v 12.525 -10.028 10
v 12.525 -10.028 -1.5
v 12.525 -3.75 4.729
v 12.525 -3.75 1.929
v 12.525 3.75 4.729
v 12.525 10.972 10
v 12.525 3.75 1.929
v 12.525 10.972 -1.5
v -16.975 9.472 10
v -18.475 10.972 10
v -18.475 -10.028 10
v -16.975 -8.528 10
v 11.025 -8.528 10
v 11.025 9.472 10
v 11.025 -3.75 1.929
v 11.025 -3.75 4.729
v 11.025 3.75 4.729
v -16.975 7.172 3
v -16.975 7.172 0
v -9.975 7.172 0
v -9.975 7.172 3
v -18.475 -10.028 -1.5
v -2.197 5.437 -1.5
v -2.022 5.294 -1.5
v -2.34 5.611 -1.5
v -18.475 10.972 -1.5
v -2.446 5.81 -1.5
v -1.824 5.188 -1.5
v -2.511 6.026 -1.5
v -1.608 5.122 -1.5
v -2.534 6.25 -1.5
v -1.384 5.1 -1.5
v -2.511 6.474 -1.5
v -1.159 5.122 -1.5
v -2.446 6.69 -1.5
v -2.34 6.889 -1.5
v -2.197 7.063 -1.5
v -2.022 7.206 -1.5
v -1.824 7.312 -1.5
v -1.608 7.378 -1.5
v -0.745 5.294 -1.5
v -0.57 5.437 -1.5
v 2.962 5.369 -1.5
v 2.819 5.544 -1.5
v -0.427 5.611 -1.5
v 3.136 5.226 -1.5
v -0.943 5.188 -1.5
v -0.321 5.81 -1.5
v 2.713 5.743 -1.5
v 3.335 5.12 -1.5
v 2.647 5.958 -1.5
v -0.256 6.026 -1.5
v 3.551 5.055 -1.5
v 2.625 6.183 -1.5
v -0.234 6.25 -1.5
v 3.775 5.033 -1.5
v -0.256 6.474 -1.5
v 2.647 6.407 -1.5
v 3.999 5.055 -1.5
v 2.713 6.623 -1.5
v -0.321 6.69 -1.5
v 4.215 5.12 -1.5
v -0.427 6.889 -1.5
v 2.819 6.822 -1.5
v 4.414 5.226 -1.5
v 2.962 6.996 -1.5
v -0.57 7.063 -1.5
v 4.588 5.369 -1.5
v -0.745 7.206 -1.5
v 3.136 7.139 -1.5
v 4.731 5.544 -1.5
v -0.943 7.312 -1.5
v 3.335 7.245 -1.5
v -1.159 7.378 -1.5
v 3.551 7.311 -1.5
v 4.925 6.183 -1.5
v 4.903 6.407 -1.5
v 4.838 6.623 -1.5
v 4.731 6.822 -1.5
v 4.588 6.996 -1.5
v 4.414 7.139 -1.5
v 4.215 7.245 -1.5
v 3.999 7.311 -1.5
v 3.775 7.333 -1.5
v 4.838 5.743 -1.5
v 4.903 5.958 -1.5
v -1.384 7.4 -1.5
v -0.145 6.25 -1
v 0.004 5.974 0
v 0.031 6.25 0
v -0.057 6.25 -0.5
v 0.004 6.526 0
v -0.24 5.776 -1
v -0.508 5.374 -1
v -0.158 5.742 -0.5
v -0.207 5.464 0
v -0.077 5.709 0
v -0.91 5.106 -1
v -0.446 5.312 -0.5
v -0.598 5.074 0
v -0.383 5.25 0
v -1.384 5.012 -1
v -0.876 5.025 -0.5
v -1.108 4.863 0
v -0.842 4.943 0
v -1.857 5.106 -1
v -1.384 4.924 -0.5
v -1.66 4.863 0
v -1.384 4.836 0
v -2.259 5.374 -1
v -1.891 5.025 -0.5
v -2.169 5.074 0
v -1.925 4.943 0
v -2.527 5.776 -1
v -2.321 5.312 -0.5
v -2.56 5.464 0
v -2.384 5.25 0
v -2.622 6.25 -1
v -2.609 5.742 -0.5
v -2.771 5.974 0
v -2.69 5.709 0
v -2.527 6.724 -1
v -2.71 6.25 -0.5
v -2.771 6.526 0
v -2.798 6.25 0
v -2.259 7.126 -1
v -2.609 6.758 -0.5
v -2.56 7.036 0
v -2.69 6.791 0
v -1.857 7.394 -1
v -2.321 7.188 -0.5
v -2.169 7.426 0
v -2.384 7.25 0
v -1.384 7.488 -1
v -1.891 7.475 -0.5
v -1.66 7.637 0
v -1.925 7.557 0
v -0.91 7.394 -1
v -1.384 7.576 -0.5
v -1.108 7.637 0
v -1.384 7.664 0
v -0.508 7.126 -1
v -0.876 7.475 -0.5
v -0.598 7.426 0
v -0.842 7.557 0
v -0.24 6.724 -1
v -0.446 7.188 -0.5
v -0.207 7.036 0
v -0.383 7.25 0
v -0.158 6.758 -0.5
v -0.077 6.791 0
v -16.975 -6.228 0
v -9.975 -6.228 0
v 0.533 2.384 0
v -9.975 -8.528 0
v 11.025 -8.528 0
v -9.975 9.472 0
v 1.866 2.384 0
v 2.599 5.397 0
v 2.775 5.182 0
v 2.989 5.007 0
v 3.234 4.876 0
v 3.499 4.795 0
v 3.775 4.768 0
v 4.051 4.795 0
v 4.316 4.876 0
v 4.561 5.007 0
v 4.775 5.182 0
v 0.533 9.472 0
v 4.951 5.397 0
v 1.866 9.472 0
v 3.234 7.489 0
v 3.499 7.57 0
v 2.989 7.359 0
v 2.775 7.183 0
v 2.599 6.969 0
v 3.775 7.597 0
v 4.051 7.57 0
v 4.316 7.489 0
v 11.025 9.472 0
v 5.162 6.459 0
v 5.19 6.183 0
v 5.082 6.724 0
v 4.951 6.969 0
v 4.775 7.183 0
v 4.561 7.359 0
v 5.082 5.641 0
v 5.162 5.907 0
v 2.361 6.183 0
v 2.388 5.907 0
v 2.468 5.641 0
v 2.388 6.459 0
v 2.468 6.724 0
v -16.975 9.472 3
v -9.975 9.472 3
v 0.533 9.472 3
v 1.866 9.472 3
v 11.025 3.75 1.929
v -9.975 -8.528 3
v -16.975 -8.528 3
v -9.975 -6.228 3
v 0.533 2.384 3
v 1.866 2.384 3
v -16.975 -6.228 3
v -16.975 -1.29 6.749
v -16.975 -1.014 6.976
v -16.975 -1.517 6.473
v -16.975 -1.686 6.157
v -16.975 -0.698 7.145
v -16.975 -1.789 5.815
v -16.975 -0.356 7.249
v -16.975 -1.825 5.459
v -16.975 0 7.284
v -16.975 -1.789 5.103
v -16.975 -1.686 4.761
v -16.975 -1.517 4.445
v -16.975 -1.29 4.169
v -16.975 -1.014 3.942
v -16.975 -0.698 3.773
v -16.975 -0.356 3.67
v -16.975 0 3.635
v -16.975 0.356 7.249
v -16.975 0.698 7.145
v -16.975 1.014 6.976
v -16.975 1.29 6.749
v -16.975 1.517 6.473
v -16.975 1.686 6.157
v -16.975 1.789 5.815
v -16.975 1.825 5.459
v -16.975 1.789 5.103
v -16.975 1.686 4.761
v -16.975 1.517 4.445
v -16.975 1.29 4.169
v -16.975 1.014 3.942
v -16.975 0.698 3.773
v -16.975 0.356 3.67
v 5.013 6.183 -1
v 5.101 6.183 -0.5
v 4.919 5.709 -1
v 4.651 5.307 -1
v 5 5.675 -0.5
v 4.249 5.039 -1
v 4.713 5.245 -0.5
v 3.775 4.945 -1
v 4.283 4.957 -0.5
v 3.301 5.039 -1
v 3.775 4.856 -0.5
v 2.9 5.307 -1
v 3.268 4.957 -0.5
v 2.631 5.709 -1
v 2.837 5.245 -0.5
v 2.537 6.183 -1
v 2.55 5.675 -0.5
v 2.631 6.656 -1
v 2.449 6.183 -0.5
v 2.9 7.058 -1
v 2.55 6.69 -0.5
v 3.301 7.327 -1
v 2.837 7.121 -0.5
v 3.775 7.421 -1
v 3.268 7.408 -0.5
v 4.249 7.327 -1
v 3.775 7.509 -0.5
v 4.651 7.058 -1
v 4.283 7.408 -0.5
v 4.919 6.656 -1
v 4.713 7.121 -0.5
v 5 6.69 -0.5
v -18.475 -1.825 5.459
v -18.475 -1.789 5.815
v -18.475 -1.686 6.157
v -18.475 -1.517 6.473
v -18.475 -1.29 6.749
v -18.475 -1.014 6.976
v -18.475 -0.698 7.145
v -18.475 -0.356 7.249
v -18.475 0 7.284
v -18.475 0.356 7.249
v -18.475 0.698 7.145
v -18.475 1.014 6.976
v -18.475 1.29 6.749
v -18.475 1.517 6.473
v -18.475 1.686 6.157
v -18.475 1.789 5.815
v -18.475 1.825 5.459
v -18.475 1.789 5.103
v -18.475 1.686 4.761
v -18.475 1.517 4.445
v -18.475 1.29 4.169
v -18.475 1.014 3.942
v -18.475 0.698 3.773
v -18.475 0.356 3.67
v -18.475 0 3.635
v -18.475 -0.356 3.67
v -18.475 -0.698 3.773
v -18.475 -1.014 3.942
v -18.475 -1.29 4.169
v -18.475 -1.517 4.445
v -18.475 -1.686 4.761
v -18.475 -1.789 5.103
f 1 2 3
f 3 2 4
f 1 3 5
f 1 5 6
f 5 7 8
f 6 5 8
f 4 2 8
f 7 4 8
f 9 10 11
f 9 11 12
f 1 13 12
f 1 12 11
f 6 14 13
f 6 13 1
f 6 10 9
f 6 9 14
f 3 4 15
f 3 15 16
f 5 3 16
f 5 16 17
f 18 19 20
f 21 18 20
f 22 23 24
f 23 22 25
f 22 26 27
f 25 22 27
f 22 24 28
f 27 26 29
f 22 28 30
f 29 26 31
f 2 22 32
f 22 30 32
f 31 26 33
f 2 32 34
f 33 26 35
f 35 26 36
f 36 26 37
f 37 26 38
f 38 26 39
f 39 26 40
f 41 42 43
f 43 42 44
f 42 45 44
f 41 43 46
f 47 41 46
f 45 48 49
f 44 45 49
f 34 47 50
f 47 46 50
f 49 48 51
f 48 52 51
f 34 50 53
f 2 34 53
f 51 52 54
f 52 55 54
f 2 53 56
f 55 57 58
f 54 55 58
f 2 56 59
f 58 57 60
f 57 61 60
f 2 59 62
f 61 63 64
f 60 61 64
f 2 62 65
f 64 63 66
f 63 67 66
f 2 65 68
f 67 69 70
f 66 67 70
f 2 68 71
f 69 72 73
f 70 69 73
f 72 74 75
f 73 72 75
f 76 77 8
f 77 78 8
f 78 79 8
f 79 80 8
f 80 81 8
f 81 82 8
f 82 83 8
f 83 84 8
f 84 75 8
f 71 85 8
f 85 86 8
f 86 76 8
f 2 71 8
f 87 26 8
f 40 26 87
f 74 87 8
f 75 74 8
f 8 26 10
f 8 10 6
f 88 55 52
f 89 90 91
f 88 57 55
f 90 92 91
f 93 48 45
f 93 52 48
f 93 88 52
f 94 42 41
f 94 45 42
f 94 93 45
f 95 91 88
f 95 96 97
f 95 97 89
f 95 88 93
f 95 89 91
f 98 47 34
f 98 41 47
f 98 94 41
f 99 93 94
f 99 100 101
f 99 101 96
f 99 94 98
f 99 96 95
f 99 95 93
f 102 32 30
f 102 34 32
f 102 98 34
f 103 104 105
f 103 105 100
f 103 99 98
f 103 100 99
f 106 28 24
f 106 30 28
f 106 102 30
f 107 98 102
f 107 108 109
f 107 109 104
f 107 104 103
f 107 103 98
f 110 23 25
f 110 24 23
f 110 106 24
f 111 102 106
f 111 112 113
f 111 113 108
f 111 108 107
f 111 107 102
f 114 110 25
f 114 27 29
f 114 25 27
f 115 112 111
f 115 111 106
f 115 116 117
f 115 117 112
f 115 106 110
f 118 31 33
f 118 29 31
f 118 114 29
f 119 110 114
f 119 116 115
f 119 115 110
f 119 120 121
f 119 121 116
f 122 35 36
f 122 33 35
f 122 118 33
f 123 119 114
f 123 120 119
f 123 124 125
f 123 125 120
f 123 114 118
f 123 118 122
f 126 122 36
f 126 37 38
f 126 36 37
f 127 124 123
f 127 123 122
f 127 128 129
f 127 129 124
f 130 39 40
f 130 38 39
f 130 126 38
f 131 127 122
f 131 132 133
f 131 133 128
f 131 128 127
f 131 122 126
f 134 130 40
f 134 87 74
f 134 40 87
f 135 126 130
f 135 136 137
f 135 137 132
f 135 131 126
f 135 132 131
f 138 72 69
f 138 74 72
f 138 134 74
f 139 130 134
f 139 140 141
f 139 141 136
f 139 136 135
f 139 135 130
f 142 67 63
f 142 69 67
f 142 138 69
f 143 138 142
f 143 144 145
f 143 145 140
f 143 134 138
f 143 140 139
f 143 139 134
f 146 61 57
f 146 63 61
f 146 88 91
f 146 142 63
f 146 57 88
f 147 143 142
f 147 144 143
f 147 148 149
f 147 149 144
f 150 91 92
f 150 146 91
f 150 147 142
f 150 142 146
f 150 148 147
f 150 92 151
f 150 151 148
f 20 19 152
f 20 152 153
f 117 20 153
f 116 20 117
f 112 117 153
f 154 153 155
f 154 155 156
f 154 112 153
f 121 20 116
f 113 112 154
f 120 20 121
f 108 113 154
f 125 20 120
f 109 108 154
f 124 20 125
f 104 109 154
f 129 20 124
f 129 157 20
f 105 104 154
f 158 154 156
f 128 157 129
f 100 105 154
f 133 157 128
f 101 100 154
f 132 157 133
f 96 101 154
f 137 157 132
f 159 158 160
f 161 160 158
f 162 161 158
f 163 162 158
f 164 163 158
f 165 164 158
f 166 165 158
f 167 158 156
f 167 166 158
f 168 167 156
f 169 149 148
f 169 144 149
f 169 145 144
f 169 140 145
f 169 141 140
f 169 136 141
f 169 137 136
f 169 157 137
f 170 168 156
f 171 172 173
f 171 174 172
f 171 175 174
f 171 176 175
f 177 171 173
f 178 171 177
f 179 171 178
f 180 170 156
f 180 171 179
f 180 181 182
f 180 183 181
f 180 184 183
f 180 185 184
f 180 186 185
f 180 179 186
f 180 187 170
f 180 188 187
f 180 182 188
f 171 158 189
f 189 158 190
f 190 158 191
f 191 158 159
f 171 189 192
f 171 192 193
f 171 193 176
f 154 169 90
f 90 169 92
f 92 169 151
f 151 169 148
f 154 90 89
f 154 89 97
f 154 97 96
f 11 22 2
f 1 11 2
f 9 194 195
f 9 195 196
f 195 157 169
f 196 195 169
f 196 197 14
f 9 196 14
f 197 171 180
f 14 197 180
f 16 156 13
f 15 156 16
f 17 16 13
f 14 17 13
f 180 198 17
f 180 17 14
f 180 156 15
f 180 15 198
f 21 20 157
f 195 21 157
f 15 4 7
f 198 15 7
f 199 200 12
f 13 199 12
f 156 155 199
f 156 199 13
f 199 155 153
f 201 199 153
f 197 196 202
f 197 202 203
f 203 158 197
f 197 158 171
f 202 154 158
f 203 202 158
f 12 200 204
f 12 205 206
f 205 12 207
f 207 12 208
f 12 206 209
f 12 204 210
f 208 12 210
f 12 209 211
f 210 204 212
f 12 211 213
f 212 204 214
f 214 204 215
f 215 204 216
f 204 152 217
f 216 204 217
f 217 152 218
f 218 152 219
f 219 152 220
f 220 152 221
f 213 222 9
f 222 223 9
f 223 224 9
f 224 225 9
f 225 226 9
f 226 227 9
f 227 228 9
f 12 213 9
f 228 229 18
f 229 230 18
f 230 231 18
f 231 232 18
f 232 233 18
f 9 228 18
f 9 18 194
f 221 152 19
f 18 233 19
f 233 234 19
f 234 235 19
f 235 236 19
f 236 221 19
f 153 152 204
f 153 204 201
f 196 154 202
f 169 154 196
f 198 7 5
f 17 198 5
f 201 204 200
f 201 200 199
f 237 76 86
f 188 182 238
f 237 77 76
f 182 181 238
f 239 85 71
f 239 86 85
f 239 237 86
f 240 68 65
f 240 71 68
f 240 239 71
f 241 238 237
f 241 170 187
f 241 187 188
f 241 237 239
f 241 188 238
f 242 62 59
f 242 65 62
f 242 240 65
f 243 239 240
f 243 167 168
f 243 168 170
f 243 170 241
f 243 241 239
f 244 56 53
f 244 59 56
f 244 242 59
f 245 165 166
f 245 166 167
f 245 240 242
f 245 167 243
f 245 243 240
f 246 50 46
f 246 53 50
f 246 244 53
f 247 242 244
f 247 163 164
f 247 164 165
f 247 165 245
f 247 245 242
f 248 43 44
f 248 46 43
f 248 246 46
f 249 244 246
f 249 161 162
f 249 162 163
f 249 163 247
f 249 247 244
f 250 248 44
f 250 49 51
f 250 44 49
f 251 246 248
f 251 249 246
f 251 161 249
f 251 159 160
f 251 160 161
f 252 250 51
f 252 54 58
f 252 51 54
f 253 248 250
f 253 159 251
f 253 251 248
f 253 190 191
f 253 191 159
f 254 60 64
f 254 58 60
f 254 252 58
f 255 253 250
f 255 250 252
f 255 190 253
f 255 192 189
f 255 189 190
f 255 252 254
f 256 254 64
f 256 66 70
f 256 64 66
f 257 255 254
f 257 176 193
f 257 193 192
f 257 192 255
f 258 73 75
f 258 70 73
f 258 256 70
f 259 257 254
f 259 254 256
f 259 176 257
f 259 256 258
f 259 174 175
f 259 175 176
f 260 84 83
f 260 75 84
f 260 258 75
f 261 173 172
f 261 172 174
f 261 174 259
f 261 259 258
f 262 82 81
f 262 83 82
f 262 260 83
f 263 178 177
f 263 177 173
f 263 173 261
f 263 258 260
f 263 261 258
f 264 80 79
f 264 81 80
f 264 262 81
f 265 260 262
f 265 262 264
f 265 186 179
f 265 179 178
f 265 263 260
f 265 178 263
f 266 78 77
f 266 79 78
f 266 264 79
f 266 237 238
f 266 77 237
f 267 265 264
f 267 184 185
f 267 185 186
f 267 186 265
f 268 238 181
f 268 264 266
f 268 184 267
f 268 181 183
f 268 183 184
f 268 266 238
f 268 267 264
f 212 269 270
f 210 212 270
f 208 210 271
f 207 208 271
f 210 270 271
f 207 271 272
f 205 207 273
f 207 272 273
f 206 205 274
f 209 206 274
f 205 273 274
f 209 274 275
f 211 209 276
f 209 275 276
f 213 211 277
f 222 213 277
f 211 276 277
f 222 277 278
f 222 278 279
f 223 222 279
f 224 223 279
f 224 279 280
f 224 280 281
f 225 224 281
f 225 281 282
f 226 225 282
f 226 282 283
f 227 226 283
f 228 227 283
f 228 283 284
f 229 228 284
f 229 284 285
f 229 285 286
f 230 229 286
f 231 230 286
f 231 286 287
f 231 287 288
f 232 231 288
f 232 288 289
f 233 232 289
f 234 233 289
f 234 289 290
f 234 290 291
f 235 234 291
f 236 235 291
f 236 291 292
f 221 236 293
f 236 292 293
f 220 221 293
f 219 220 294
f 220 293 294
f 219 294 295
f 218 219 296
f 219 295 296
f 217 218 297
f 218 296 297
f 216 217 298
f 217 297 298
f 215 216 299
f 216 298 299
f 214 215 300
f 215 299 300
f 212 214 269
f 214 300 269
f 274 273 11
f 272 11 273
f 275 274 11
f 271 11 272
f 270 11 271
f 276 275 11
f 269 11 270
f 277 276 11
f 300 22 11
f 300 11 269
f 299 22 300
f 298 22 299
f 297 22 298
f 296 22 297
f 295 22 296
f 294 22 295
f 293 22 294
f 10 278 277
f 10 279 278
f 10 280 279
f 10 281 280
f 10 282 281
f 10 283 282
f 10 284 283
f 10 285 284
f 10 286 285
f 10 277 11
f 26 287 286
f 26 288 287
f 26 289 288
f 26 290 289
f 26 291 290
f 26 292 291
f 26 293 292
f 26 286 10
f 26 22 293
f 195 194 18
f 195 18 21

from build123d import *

# Parameters (mm, degrees)
F0_W      = 28
F0_H      = 18
F1_DEPTH  = 10
F2_T      = 1.5
F3_W      = 7.5
F3_H      = 2.8
F4_DEPTH  = 2
F5_R      = 1.15
F6_DEPTH  = 3
F6_TAPER  = -10
F7_W      = 1.3330084621
F7_H      = 7.0881857659
F7_W_2    = 7
F7_H_2    = 2.3
F8_DEPTH  = 3
F9_R      = 1.8245236246
F10_DEPTH = 5


with BuildPart() as f1:
    # F0 (on Top) → F1 (new body)
    with BuildSketch(Plane.XY):
        with Locations((-2.9748789966, 0.4724050845)):
            Rectangle(F0_W, F0_H)
    extrude(amount=F1_DEPTH)

    # F2
    f2_openings = [f1.faces().sort_by_distance(p)[0] for p in [
        (-2.974879, 0.472405, 10),
    ]]
    offset(amount=F2_T, openings=f2_openings, kind=Kind.INTERSECTION)

    # F3 (on face) → F4 (cut)
    with BuildSketch(Plane.YZ.offset(12.5251210034)):
        with Locations((0, 3.3291981078)):
            Rectangle(F3_W, F3_H)
    extrude(amount=-F4_DEPTH, mode=Mode.SUBTRACT)

    # F5 (on face) → F6 (cut)
    with BuildSketch(Plane(origin=(0, 0, -1.5), x_dir=(1, 0, 0), z_dir=(0, 0, -1))):
        with Locations((-1.3835662976, -6.25)):
            Circle(F5_R)
        with Locations((3.7751210034, -6.1826660439)):
            Circle(F5_R)
    extrude(amount=-F6_DEPTH, taper=F6_TAPER, mode=Mode.SUBTRACT)

    # F7 (on face) → F8 (join)
    with BuildSketch(Plane.XY):
        with Locations((1.1995443201, 5.9283122016)):
            Rectangle(F7_W, F7_H)
        with Locations((-13.4748789966, -7.3775949155)):
            Rectangle(F7_W_2, F7_H_2)
        with Locations((-13.4748789966, 8.3224050845)):
            Rectangle(F7_W_2, F7_H_2)
    extrude(amount=F8_DEPTH)

    # F9 (on face) → F10 (cut)
    with BuildSketch(Plane(origin=(-18.4748789966, 0, 0), x_dir=(0, -1, 0), z_dir=(-1, 0, 0))):
        with Locations((0, 5.4590702057)):
            Circle(F9_R)
    extrude(amount=-F10_DEPTH, mode=Mode.SUBTRACT)


solid = f1.part
